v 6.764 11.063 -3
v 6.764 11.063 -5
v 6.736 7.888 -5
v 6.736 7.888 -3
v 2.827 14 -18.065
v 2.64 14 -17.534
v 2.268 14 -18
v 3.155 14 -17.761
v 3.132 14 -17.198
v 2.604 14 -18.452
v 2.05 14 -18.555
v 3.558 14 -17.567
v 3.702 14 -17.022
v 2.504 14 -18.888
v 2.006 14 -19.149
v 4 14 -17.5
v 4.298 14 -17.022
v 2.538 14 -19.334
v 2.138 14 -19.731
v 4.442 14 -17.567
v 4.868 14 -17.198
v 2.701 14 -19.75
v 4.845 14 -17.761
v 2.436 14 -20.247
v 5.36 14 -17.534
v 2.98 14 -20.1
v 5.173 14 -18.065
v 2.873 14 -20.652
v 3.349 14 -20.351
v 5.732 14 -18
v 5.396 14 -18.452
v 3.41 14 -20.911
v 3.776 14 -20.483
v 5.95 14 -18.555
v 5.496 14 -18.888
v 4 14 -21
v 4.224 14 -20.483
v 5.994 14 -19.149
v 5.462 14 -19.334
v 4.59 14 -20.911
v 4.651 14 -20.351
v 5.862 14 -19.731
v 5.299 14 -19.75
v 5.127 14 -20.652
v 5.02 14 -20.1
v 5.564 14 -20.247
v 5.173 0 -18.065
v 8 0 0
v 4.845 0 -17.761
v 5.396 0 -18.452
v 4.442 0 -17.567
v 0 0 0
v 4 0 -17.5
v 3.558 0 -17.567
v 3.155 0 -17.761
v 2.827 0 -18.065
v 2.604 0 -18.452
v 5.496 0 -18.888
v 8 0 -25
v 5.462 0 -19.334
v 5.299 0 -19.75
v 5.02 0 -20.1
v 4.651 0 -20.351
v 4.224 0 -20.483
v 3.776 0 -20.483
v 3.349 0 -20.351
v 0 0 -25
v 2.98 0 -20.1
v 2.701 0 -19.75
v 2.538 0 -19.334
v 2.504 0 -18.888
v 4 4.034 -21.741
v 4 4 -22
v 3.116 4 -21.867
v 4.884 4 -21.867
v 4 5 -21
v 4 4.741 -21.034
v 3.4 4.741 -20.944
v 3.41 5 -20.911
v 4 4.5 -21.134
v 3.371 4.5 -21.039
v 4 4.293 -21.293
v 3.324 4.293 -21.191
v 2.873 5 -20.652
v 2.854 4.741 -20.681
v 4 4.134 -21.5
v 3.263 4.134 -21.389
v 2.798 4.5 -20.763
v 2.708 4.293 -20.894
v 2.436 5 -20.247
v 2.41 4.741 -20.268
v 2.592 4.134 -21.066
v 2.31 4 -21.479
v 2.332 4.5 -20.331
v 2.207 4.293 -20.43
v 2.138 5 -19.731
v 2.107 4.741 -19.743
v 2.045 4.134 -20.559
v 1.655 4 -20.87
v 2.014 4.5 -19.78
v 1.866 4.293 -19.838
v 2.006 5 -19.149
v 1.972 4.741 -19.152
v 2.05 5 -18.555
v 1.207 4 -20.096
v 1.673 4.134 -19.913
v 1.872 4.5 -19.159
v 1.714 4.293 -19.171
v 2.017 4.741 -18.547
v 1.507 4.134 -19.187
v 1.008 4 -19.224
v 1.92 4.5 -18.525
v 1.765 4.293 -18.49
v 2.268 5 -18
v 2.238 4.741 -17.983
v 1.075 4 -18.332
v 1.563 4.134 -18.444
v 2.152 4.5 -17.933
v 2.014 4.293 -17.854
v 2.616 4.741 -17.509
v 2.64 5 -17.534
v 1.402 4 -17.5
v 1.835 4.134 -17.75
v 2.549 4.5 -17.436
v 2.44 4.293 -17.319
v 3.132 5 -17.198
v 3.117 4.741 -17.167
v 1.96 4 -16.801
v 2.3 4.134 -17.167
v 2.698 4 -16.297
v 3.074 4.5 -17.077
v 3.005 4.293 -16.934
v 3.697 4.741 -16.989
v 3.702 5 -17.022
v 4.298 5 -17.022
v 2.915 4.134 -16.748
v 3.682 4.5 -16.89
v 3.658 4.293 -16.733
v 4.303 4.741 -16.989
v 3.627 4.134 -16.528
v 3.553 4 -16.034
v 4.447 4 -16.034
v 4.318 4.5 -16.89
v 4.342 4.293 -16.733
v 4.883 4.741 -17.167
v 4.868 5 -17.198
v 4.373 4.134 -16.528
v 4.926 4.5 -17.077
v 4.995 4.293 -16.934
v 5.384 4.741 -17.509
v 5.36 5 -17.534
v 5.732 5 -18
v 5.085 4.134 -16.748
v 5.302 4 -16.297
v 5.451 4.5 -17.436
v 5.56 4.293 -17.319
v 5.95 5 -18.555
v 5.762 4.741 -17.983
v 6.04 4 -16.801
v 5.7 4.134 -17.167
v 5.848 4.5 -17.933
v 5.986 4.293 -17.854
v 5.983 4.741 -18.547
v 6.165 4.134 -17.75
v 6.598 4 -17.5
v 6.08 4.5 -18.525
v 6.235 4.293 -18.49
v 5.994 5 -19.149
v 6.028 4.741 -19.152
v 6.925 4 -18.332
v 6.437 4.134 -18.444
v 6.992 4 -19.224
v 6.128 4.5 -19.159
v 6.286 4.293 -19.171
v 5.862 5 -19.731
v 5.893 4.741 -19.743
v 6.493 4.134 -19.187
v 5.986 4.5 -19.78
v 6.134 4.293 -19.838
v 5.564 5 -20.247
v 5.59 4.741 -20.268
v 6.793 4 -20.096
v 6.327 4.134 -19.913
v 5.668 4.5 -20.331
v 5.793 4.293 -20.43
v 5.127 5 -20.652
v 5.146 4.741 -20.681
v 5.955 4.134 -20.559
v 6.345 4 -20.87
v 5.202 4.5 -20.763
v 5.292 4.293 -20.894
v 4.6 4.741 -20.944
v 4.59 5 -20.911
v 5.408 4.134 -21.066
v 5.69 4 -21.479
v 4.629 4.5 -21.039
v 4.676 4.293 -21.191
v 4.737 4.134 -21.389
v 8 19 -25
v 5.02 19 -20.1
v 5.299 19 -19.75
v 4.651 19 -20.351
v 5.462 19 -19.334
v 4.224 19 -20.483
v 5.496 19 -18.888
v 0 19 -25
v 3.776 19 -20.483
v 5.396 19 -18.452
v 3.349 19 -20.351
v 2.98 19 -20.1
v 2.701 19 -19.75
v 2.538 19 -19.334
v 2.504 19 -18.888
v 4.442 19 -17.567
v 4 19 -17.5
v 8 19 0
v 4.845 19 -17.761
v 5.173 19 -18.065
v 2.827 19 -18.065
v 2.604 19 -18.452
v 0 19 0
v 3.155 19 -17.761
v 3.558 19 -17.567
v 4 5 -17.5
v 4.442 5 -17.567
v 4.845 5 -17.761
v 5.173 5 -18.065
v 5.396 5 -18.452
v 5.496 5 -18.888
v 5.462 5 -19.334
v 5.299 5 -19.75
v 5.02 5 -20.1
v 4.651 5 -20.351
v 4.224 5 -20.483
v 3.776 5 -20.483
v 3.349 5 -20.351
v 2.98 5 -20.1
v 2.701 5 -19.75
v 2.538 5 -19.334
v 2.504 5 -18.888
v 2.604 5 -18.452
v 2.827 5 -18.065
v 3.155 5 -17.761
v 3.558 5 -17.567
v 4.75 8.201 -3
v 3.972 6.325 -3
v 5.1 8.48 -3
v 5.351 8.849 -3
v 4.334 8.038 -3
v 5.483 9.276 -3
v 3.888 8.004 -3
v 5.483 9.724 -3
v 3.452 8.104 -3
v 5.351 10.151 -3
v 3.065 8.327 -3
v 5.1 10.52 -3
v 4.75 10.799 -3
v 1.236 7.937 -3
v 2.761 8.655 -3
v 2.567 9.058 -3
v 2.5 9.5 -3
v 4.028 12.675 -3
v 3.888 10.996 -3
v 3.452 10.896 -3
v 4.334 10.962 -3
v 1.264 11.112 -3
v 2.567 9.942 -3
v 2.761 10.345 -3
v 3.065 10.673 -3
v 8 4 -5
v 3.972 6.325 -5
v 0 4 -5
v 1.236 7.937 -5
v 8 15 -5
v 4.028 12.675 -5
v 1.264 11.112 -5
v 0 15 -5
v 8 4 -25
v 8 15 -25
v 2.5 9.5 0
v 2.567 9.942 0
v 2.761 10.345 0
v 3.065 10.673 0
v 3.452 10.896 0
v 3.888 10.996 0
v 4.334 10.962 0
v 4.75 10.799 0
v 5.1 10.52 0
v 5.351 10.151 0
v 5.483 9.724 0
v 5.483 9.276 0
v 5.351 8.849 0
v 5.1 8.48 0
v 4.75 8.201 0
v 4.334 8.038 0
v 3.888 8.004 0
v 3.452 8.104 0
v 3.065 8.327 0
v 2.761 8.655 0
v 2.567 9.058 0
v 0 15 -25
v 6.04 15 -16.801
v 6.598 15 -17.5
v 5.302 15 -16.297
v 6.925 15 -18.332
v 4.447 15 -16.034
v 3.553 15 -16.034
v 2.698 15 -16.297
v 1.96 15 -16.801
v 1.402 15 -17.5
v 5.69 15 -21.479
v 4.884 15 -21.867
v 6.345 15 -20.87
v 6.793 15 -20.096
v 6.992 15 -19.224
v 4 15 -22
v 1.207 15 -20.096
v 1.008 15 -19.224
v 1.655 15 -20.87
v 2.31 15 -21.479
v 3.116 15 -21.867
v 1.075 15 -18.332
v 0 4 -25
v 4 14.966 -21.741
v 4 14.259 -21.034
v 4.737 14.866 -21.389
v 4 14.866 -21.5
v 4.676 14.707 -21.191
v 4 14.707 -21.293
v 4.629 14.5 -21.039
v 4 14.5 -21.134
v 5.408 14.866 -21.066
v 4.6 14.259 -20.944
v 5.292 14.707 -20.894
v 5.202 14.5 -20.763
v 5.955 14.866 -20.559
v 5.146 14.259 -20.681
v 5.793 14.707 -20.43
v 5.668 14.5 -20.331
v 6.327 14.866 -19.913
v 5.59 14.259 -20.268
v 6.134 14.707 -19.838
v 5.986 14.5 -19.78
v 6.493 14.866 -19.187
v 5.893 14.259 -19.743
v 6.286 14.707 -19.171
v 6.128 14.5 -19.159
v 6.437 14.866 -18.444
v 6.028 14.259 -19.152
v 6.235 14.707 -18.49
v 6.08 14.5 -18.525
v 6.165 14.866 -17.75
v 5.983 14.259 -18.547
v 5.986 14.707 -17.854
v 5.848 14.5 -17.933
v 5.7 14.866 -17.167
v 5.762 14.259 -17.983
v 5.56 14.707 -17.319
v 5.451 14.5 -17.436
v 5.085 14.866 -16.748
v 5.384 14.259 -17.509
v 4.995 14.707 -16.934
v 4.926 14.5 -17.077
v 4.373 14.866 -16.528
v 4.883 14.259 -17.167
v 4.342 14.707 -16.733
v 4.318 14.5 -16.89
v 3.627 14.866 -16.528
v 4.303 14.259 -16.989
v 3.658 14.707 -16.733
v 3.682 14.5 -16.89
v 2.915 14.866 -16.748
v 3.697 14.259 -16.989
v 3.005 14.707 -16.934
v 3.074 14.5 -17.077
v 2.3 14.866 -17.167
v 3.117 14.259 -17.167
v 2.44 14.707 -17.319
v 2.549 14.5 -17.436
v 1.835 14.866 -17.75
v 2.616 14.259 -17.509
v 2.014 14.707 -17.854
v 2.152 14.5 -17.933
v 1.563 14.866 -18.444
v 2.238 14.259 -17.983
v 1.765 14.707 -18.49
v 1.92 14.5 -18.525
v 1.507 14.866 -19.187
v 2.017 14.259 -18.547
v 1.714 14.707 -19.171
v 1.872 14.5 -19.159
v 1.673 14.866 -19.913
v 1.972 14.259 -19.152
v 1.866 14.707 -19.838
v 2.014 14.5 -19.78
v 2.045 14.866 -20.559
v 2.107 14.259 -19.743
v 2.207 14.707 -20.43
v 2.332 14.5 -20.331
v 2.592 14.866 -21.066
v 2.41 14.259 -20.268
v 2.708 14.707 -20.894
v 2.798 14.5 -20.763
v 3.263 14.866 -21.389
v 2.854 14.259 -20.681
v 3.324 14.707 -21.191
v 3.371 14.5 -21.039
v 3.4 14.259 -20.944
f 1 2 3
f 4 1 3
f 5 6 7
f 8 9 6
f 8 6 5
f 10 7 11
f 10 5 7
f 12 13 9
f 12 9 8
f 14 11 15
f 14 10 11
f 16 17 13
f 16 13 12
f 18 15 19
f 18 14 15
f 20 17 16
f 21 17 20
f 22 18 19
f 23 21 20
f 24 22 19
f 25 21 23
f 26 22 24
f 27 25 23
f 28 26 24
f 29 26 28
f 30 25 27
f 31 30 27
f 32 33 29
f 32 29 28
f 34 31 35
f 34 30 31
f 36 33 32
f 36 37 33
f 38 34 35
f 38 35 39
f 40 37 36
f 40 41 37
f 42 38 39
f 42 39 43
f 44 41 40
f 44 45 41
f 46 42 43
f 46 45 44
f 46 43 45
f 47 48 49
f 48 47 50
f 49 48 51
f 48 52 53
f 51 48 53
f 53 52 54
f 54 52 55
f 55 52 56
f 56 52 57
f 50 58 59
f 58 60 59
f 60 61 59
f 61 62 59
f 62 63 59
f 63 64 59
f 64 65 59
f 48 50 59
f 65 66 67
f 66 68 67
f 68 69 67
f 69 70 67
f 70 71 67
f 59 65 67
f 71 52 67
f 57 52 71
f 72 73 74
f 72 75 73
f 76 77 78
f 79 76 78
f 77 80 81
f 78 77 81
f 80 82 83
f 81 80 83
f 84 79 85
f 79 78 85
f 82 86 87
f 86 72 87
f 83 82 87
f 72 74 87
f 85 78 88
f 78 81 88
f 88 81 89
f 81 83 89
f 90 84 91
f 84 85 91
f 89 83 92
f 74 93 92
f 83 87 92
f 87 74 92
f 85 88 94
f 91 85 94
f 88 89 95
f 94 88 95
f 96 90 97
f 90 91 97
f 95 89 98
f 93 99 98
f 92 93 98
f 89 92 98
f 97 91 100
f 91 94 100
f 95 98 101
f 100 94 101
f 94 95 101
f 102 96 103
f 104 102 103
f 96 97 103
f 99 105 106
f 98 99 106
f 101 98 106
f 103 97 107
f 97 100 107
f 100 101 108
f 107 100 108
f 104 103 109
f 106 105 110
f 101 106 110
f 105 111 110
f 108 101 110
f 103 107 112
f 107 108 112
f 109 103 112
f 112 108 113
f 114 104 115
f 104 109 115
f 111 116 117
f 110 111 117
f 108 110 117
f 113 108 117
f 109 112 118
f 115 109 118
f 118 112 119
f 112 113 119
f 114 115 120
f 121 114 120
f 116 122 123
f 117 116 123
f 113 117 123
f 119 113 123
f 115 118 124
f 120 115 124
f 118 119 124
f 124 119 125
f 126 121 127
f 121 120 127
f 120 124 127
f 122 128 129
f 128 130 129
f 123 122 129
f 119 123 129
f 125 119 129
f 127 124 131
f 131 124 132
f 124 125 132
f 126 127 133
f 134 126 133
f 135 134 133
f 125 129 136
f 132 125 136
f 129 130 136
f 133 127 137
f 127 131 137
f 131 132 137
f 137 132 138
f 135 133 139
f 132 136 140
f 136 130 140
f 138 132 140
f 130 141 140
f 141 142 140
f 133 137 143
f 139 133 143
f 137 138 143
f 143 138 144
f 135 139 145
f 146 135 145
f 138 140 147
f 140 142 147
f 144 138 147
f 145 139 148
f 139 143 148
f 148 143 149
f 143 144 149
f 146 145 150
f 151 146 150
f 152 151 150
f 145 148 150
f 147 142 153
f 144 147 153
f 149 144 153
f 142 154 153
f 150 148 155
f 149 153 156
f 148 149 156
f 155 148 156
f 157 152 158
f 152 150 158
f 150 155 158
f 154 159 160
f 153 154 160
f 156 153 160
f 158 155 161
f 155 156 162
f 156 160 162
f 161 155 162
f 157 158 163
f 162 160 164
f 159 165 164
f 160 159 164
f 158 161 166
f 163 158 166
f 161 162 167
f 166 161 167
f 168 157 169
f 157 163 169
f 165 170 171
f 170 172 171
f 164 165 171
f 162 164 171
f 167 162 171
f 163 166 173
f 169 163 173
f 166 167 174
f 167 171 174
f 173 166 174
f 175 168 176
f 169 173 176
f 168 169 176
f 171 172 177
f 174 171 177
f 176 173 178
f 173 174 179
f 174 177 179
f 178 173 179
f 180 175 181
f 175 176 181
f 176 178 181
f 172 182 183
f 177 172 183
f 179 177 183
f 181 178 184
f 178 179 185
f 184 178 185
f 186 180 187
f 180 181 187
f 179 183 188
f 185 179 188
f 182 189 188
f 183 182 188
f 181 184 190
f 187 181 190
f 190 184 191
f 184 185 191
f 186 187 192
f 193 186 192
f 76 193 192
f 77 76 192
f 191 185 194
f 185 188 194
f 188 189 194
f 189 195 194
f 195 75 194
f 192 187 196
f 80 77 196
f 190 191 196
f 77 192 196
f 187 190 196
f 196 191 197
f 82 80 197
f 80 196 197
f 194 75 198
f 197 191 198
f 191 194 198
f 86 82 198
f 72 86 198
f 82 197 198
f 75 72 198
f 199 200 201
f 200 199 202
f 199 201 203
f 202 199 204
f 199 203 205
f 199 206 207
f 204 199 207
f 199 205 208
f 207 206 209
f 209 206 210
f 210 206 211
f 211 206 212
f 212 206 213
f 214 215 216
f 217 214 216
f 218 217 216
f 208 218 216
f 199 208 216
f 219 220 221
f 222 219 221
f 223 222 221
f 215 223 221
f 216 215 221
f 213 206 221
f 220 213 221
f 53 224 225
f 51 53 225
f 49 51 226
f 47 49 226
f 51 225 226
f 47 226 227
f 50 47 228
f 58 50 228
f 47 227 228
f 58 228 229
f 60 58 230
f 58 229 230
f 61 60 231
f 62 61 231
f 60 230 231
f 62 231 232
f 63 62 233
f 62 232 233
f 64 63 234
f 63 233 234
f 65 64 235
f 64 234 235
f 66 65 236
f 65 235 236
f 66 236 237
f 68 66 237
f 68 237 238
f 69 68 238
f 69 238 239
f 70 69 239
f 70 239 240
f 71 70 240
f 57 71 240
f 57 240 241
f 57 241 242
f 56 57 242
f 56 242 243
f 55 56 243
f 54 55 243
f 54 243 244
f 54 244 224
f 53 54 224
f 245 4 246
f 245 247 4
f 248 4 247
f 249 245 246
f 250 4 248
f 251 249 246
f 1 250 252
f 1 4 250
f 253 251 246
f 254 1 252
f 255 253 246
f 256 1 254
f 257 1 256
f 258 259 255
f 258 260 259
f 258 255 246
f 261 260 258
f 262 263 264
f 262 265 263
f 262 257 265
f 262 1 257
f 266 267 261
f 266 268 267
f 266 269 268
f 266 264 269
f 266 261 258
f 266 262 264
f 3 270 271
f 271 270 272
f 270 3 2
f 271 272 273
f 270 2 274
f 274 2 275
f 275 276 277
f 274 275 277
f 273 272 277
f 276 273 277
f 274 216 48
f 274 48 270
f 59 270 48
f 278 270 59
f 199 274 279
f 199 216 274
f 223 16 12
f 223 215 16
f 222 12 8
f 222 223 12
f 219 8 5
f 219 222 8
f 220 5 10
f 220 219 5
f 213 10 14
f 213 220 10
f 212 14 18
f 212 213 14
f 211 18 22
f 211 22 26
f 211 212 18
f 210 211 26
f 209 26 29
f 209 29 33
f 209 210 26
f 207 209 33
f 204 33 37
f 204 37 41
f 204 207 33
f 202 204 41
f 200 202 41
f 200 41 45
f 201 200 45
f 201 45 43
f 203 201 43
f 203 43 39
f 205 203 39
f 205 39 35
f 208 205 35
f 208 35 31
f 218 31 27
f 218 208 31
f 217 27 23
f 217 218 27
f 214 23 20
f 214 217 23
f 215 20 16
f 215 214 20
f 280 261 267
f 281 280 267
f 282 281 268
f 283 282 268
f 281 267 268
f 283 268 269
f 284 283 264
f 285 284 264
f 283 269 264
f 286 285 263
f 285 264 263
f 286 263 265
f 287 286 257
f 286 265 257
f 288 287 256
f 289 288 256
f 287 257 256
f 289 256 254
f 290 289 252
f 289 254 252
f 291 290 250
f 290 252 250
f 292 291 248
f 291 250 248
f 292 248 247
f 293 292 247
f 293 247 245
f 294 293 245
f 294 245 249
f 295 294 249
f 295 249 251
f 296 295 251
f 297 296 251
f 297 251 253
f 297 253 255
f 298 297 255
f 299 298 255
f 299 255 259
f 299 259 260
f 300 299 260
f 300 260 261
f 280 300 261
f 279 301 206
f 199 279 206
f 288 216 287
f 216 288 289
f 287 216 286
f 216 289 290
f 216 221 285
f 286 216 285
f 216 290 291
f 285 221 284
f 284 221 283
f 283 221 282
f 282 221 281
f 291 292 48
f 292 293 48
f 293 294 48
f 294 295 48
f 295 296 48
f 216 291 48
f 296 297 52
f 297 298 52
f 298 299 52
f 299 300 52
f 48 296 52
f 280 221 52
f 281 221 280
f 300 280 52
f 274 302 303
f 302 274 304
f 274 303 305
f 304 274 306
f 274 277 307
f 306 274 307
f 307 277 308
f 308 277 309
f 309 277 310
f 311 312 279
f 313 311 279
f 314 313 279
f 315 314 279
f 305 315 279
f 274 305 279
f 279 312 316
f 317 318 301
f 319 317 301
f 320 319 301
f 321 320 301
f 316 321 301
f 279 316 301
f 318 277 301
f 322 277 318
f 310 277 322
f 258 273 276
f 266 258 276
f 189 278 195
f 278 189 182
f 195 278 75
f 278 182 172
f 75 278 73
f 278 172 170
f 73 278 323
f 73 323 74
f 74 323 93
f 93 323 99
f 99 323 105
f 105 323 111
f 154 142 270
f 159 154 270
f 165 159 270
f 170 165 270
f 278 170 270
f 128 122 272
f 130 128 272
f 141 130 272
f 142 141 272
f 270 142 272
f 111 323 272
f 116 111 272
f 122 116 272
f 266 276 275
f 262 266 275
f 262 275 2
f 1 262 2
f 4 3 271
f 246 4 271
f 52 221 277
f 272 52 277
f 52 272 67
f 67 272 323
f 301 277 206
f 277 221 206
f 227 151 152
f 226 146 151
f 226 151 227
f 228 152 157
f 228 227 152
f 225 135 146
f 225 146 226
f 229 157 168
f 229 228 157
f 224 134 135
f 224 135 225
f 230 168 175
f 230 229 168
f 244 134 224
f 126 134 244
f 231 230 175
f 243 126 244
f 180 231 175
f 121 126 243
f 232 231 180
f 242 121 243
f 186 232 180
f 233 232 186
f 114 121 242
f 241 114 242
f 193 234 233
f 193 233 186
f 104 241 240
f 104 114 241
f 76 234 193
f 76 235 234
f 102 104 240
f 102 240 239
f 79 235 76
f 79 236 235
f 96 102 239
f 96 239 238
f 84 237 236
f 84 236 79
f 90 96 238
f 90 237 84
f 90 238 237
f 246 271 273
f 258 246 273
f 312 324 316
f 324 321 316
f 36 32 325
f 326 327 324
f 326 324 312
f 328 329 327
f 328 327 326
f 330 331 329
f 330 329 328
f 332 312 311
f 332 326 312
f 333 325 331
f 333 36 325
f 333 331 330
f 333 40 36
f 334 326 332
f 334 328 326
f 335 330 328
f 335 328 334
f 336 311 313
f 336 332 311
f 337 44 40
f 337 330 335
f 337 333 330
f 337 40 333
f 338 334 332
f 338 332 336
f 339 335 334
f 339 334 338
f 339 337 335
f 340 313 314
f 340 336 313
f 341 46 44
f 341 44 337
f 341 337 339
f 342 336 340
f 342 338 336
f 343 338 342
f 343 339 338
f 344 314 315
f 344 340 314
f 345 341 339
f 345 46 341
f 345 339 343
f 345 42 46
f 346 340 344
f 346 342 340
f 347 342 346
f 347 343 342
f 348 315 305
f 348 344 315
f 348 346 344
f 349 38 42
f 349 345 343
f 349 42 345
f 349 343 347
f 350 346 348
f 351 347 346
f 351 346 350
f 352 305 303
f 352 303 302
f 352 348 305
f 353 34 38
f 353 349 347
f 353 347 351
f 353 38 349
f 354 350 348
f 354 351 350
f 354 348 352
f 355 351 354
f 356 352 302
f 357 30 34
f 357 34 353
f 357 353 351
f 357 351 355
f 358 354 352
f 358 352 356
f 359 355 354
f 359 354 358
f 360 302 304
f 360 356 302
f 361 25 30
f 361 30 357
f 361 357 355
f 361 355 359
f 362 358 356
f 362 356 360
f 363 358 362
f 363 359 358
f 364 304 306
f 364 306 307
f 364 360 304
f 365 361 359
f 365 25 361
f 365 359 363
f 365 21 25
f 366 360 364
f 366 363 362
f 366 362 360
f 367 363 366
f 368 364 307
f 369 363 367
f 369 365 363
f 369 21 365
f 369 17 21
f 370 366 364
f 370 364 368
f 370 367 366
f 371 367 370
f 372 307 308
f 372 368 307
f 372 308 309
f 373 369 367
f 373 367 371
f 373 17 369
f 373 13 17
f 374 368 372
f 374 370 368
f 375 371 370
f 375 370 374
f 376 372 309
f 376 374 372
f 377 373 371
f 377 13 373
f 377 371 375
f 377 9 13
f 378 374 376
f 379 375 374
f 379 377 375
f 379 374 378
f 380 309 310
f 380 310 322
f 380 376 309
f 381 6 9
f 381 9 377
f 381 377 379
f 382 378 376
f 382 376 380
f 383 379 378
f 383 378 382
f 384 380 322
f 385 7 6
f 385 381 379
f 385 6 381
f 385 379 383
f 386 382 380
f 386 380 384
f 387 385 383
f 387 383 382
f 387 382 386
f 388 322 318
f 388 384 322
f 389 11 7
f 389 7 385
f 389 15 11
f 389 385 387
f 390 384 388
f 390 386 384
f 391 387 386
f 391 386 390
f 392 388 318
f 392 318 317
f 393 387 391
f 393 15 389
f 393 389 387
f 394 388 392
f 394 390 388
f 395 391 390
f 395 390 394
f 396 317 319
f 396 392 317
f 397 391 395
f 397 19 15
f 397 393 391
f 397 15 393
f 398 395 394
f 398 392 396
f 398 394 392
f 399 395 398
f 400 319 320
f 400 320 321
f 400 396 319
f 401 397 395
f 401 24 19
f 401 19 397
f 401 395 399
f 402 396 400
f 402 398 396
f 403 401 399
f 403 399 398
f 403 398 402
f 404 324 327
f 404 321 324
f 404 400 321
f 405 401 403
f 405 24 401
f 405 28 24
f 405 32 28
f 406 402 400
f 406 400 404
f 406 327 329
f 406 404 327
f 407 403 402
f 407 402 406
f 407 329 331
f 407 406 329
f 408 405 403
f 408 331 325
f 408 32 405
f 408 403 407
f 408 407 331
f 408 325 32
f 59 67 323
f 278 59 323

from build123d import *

# Parameters (mm, degrees)
EXTRUDE_1_DEPTH     = 8
CUT_EXTRUDE_1_REACH = 34.404
SKETCH_4_R          = 1.5
EXTRUDE_START       = 1
SKETCH_5_R          = 2
SKETCH_5_R_2        = 1.5
EXTRUDE_2_DEPTH     = 1
SKETCH_6_R          = 2
SKETCH_6_R_2        = 1.5
EXTRUDE_3_DEPTH     = 1
FILLET_1_R          = 1
FILLET_2_R          = 1
SKETCH_7_R          = 1.5
CUT_EXTRUDE_2_DEPTH = 5
CUT_EXTRUDE_3_DEPTH = 2


with BuildPart() as part:
    # Эскиз3 → Бобышка-Вытянуть1 (new body)
    with BuildSketch(Plane(origin=(0, 0, 0), x_dir=(0, 0, -1), z_dir=(1, 0, 0))):
        Polygon((0, 0), (25, 0), (25, 4), (5, 4), (5, 15), (25, 15), (25, 19), (0, 19), align=None)
    extrude(amount=EXTRUDE_1_DEPTH)

    # Вырез-Вытянуть1: up to this face of the body (flat: up to its plane)
    cut_extrude_1_end = Plane(part.part.faces().sort_by_distance((4, 0, -12.5))[0])
    # Эскиз4 → Вырез-Вытянуть1 (cut, up to the picked face)
    with BuildSketch(Plane(origin=(0, 19, 0), x_dir=(1, 0, 0), z_dir=(0, 1, 0)), mode=Mode.PRIVATE) as cut_extrude_1_sk1:
        with Locations(Location((4, 19, 0), (0, 0, 270))):
            Circle(SKETCH_4_R)
    cut_extrude_1_tool1 = split(extrude(cut_extrude_1_sk1.sketch, amount=-CUT_EXTRUDE_1_REACH, mode=Mode.PRIVATE), bisect_by=cut_extrude_1_end, keep=Keep.BOTH, mode=Mode.PRIVATE)
    add(cut_extrude_1_tool1.solids().sort_by(Axis((4, 19, -19), (0, -1, 0)))[0], mode=Mode.SUBTRACT)

    # Эскиз5 → Бобышка-Вытянуть2 (add)
    with BuildSketch(Plane(origin=(0, 4, 0), x_dir=(1, 0, 0), z_dir=(0, 1, 0)).offset(EXTRUDE_START)):
        with Locations(Location((4, 19, 0), (0, 0, 90))):
            Circle(SKETCH_5_R)
        with Locations(Location((4, 19, 0), (0, 0, 270))):
            Circle(SKETCH_5_R_2, mode=Mode.SUBTRACT)
    extrude(amount=-EXTRUDE_2_DEPTH)

    # Эскиз6 → Бобышка-Вытянуть3 (add)
    with BuildSketch(Plane(origin=(0, 15, 0), x_dir=(-1, 0, 0), z_dir=(0, -1, 0))):
        with Locations(Location((-4, 19, 0), (0, 0, 90))):
            Circle(SKETCH_6_R)
        with Locations(Location((-4, 19, 0), (0, 0, 270))):
            Circle(SKETCH_6_R_2, mode=Mode.SUBTRACT)
    extrude(amount=EXTRUDE_3_DEPTH)

    # Скругление1
    fillet_1_edges = [part.edges().sort_by_distance(p)[0] for p in [
        (4, 4, -17),
    ]]
    fillet(fillet_1_edges, radius=FILLET_1_R - 0.0001)  # a hair under: the kernel refuses the full size

    # Скругление2
    fillet_2_edges = [part.edges().sort_by_distance(p)[0] for p in [
        (4, 15, -17),
    ]]
    fillet(fillet_2_edges, radius=FILLET_2_R - 0.0001)  # a hair under: the kernel refuses the full size

    # Эскиз7 → Вырез-Вытянуть2 (cut)
    with BuildSketch(Plane(origin=(0, 0, -5), x_dir=(-1, 0, 0), z_dir=(0, 0, -1))):
        with Locations((-4, 9.5)):
            Circle(SKETCH_7_R)
    extrude(amount=-CUT_EXTRUDE_2_DEPTH, mode=Mode.SUBTRACT)

    # Эскиз9 → Вырез-Вытянуть3 (cut)
    with BuildSketch(Plane(origin=(0, 0, -5), x_dir=(-1, 0, 0), z_dir=(0, 0, -1))):
        Polygon((-1.264118223, 11.111919426), (-4.028022284, 12.675302834), (-6.763904061, 11.063383407), (-6.735881777, 7.888080574), (-3.971977716, 6.324697166), (-1.236095939, 7.936616593), align=None)
    extrude(amount=-CUT_EXTRUDE_3_DEPTH, mode=Mode.SUBTRACT)


solid = part.part
